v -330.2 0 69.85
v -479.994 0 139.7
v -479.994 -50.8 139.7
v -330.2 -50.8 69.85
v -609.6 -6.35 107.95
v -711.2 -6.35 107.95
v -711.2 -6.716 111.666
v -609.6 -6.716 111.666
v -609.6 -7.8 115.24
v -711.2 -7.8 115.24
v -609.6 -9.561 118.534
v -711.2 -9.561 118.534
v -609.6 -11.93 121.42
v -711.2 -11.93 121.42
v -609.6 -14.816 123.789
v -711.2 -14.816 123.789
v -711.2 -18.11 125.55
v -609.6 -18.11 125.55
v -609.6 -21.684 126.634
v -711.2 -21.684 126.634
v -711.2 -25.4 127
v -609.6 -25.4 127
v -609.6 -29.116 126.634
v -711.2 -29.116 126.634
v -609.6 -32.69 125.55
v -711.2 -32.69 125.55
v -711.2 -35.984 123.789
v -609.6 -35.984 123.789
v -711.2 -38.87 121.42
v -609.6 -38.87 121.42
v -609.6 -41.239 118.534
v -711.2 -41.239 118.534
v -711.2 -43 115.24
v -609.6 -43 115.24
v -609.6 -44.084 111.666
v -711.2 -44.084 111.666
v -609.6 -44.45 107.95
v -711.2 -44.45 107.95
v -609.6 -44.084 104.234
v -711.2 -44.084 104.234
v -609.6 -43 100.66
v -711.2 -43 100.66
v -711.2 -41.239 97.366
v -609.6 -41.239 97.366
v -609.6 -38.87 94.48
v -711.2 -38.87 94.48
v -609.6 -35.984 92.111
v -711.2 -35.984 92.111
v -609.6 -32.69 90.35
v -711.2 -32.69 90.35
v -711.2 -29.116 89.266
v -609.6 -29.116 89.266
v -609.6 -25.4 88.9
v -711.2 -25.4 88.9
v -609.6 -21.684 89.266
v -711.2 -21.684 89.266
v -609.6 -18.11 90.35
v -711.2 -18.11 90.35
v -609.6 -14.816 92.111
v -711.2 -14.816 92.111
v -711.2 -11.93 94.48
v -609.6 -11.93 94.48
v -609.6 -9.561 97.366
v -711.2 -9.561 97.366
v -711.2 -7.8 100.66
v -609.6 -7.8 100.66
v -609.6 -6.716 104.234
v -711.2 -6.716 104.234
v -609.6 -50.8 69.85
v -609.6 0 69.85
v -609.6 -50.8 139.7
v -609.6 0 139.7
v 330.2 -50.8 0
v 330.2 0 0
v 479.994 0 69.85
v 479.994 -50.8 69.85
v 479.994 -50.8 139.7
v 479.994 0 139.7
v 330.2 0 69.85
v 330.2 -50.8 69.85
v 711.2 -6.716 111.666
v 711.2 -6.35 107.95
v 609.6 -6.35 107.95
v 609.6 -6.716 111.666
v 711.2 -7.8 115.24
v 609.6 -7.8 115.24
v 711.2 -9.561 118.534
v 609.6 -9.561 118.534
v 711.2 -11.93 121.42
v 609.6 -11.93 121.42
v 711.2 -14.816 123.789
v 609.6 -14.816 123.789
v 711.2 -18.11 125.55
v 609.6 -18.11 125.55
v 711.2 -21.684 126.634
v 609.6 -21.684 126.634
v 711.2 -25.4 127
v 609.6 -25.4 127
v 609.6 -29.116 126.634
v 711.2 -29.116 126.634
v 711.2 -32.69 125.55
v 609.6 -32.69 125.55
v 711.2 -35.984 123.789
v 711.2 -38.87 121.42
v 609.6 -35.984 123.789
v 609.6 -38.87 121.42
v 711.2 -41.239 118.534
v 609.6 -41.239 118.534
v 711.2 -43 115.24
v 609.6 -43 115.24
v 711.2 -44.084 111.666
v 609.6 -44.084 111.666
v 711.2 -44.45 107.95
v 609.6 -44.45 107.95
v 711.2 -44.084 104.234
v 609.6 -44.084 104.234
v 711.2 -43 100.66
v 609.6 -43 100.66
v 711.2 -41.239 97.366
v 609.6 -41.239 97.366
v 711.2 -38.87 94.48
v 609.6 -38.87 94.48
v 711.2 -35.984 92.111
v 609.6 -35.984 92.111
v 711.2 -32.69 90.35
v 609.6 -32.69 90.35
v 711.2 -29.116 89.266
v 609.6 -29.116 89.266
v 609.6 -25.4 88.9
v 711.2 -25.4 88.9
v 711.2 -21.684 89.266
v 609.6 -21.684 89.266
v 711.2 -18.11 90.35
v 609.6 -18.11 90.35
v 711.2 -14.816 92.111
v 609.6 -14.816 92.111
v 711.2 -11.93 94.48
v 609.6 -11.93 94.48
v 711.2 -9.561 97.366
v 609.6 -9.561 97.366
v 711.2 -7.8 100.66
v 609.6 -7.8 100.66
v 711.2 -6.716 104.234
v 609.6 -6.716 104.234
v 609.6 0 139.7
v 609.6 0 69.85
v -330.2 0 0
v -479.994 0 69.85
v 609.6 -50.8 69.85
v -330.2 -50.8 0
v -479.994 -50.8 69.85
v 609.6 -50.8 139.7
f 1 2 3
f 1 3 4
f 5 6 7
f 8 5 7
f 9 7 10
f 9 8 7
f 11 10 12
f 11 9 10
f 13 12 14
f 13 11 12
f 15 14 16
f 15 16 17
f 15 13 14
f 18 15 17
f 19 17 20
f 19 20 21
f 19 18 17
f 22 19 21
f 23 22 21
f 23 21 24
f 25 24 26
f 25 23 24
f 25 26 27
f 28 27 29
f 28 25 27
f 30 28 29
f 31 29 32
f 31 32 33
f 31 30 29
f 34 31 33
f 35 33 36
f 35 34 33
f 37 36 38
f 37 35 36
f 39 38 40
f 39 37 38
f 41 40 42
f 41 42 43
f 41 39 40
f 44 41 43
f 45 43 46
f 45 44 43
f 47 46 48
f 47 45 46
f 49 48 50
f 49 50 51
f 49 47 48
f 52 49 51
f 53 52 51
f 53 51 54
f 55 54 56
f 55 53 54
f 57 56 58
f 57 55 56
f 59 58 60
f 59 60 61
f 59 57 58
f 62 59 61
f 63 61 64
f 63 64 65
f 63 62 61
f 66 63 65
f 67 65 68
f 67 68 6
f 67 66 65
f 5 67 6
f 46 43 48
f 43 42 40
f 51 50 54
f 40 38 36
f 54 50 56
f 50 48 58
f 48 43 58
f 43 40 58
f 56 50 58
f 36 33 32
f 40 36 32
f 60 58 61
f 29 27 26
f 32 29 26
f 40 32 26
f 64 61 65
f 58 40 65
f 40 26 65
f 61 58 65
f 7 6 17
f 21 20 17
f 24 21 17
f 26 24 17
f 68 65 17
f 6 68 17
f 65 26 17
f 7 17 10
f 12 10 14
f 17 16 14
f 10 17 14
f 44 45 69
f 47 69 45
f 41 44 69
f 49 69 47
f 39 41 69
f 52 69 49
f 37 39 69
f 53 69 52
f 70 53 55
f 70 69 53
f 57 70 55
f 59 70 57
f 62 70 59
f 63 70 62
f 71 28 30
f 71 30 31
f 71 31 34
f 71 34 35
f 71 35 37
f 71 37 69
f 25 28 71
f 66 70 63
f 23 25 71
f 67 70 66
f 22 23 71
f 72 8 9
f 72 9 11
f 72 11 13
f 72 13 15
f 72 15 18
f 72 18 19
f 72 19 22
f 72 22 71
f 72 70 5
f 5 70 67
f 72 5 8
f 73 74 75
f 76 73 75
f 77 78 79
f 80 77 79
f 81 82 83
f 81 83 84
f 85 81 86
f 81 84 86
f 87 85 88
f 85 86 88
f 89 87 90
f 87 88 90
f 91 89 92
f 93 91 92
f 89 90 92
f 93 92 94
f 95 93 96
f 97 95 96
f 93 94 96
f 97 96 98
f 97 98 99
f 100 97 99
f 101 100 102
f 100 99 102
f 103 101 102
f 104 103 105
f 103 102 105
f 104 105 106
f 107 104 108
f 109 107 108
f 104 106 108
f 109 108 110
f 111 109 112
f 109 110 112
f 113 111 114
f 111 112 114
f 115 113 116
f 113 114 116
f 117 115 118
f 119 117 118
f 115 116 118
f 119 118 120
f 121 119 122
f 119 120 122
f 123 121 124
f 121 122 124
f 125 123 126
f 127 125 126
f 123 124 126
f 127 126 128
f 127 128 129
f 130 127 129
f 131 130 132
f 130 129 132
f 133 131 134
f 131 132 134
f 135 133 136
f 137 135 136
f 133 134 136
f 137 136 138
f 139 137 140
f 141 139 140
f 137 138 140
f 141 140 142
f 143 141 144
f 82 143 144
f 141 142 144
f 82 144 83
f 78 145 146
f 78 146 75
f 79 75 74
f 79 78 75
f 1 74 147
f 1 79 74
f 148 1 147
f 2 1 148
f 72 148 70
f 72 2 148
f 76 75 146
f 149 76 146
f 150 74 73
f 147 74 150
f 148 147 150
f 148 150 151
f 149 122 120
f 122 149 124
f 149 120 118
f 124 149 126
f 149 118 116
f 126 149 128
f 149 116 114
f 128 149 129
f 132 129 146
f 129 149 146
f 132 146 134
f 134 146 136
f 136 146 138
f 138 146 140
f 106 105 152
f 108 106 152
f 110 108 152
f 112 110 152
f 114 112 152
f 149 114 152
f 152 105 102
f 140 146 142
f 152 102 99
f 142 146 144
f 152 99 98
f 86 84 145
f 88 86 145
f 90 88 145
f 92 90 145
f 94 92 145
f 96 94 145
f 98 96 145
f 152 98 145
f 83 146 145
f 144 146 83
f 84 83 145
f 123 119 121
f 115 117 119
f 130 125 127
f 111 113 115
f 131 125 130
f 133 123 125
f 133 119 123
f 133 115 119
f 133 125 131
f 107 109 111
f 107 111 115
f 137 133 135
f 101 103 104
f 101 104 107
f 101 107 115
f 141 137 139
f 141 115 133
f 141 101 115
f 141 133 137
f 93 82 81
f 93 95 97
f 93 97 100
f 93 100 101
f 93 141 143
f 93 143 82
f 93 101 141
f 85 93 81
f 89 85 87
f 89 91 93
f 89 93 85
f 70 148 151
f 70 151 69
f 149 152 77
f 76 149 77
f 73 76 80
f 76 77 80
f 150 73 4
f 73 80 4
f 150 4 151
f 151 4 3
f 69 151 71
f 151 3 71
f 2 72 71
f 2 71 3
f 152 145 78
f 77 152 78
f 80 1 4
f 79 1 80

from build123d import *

# Parameters (mm, degrees)
F1_DEPTH = 50.8
F3_R     = 19.05
F4_DEPTH = 101.6


with BuildPart() as f1:
    # F0 (on Front) → F1 (new body)
    with BuildSketch(Plane.XZ):
        Polygon((0, 69.85), (0, 0), (330.2, 0), (479.993808, 69.85), (609.6, 69.85), (609.6, 139.7), (479.993808, 139.7), (330.2, 69.85), align=None)
    extrude(amount=F1_DEPTH)

    # F2: F1 across plane


with BuildPart() as f1_1:
    add(f1.part)
    add(f1.part.mirror(Plane.YZ))

    # F3 (on face) → F4 (join)
    with BuildSketch(Plane.YZ.offset(609.6)):
        with Locations((-25.4, 107.95)):
            Circle(F3_R)
    extrude(amount=F4_DEPTH)

    # F5: F1 across plane


with BuildPart() as f1_2:
    add(f1_1.part)
    add(f1_1.part.mirror(Plane.YZ))


solid = f1_2.part
